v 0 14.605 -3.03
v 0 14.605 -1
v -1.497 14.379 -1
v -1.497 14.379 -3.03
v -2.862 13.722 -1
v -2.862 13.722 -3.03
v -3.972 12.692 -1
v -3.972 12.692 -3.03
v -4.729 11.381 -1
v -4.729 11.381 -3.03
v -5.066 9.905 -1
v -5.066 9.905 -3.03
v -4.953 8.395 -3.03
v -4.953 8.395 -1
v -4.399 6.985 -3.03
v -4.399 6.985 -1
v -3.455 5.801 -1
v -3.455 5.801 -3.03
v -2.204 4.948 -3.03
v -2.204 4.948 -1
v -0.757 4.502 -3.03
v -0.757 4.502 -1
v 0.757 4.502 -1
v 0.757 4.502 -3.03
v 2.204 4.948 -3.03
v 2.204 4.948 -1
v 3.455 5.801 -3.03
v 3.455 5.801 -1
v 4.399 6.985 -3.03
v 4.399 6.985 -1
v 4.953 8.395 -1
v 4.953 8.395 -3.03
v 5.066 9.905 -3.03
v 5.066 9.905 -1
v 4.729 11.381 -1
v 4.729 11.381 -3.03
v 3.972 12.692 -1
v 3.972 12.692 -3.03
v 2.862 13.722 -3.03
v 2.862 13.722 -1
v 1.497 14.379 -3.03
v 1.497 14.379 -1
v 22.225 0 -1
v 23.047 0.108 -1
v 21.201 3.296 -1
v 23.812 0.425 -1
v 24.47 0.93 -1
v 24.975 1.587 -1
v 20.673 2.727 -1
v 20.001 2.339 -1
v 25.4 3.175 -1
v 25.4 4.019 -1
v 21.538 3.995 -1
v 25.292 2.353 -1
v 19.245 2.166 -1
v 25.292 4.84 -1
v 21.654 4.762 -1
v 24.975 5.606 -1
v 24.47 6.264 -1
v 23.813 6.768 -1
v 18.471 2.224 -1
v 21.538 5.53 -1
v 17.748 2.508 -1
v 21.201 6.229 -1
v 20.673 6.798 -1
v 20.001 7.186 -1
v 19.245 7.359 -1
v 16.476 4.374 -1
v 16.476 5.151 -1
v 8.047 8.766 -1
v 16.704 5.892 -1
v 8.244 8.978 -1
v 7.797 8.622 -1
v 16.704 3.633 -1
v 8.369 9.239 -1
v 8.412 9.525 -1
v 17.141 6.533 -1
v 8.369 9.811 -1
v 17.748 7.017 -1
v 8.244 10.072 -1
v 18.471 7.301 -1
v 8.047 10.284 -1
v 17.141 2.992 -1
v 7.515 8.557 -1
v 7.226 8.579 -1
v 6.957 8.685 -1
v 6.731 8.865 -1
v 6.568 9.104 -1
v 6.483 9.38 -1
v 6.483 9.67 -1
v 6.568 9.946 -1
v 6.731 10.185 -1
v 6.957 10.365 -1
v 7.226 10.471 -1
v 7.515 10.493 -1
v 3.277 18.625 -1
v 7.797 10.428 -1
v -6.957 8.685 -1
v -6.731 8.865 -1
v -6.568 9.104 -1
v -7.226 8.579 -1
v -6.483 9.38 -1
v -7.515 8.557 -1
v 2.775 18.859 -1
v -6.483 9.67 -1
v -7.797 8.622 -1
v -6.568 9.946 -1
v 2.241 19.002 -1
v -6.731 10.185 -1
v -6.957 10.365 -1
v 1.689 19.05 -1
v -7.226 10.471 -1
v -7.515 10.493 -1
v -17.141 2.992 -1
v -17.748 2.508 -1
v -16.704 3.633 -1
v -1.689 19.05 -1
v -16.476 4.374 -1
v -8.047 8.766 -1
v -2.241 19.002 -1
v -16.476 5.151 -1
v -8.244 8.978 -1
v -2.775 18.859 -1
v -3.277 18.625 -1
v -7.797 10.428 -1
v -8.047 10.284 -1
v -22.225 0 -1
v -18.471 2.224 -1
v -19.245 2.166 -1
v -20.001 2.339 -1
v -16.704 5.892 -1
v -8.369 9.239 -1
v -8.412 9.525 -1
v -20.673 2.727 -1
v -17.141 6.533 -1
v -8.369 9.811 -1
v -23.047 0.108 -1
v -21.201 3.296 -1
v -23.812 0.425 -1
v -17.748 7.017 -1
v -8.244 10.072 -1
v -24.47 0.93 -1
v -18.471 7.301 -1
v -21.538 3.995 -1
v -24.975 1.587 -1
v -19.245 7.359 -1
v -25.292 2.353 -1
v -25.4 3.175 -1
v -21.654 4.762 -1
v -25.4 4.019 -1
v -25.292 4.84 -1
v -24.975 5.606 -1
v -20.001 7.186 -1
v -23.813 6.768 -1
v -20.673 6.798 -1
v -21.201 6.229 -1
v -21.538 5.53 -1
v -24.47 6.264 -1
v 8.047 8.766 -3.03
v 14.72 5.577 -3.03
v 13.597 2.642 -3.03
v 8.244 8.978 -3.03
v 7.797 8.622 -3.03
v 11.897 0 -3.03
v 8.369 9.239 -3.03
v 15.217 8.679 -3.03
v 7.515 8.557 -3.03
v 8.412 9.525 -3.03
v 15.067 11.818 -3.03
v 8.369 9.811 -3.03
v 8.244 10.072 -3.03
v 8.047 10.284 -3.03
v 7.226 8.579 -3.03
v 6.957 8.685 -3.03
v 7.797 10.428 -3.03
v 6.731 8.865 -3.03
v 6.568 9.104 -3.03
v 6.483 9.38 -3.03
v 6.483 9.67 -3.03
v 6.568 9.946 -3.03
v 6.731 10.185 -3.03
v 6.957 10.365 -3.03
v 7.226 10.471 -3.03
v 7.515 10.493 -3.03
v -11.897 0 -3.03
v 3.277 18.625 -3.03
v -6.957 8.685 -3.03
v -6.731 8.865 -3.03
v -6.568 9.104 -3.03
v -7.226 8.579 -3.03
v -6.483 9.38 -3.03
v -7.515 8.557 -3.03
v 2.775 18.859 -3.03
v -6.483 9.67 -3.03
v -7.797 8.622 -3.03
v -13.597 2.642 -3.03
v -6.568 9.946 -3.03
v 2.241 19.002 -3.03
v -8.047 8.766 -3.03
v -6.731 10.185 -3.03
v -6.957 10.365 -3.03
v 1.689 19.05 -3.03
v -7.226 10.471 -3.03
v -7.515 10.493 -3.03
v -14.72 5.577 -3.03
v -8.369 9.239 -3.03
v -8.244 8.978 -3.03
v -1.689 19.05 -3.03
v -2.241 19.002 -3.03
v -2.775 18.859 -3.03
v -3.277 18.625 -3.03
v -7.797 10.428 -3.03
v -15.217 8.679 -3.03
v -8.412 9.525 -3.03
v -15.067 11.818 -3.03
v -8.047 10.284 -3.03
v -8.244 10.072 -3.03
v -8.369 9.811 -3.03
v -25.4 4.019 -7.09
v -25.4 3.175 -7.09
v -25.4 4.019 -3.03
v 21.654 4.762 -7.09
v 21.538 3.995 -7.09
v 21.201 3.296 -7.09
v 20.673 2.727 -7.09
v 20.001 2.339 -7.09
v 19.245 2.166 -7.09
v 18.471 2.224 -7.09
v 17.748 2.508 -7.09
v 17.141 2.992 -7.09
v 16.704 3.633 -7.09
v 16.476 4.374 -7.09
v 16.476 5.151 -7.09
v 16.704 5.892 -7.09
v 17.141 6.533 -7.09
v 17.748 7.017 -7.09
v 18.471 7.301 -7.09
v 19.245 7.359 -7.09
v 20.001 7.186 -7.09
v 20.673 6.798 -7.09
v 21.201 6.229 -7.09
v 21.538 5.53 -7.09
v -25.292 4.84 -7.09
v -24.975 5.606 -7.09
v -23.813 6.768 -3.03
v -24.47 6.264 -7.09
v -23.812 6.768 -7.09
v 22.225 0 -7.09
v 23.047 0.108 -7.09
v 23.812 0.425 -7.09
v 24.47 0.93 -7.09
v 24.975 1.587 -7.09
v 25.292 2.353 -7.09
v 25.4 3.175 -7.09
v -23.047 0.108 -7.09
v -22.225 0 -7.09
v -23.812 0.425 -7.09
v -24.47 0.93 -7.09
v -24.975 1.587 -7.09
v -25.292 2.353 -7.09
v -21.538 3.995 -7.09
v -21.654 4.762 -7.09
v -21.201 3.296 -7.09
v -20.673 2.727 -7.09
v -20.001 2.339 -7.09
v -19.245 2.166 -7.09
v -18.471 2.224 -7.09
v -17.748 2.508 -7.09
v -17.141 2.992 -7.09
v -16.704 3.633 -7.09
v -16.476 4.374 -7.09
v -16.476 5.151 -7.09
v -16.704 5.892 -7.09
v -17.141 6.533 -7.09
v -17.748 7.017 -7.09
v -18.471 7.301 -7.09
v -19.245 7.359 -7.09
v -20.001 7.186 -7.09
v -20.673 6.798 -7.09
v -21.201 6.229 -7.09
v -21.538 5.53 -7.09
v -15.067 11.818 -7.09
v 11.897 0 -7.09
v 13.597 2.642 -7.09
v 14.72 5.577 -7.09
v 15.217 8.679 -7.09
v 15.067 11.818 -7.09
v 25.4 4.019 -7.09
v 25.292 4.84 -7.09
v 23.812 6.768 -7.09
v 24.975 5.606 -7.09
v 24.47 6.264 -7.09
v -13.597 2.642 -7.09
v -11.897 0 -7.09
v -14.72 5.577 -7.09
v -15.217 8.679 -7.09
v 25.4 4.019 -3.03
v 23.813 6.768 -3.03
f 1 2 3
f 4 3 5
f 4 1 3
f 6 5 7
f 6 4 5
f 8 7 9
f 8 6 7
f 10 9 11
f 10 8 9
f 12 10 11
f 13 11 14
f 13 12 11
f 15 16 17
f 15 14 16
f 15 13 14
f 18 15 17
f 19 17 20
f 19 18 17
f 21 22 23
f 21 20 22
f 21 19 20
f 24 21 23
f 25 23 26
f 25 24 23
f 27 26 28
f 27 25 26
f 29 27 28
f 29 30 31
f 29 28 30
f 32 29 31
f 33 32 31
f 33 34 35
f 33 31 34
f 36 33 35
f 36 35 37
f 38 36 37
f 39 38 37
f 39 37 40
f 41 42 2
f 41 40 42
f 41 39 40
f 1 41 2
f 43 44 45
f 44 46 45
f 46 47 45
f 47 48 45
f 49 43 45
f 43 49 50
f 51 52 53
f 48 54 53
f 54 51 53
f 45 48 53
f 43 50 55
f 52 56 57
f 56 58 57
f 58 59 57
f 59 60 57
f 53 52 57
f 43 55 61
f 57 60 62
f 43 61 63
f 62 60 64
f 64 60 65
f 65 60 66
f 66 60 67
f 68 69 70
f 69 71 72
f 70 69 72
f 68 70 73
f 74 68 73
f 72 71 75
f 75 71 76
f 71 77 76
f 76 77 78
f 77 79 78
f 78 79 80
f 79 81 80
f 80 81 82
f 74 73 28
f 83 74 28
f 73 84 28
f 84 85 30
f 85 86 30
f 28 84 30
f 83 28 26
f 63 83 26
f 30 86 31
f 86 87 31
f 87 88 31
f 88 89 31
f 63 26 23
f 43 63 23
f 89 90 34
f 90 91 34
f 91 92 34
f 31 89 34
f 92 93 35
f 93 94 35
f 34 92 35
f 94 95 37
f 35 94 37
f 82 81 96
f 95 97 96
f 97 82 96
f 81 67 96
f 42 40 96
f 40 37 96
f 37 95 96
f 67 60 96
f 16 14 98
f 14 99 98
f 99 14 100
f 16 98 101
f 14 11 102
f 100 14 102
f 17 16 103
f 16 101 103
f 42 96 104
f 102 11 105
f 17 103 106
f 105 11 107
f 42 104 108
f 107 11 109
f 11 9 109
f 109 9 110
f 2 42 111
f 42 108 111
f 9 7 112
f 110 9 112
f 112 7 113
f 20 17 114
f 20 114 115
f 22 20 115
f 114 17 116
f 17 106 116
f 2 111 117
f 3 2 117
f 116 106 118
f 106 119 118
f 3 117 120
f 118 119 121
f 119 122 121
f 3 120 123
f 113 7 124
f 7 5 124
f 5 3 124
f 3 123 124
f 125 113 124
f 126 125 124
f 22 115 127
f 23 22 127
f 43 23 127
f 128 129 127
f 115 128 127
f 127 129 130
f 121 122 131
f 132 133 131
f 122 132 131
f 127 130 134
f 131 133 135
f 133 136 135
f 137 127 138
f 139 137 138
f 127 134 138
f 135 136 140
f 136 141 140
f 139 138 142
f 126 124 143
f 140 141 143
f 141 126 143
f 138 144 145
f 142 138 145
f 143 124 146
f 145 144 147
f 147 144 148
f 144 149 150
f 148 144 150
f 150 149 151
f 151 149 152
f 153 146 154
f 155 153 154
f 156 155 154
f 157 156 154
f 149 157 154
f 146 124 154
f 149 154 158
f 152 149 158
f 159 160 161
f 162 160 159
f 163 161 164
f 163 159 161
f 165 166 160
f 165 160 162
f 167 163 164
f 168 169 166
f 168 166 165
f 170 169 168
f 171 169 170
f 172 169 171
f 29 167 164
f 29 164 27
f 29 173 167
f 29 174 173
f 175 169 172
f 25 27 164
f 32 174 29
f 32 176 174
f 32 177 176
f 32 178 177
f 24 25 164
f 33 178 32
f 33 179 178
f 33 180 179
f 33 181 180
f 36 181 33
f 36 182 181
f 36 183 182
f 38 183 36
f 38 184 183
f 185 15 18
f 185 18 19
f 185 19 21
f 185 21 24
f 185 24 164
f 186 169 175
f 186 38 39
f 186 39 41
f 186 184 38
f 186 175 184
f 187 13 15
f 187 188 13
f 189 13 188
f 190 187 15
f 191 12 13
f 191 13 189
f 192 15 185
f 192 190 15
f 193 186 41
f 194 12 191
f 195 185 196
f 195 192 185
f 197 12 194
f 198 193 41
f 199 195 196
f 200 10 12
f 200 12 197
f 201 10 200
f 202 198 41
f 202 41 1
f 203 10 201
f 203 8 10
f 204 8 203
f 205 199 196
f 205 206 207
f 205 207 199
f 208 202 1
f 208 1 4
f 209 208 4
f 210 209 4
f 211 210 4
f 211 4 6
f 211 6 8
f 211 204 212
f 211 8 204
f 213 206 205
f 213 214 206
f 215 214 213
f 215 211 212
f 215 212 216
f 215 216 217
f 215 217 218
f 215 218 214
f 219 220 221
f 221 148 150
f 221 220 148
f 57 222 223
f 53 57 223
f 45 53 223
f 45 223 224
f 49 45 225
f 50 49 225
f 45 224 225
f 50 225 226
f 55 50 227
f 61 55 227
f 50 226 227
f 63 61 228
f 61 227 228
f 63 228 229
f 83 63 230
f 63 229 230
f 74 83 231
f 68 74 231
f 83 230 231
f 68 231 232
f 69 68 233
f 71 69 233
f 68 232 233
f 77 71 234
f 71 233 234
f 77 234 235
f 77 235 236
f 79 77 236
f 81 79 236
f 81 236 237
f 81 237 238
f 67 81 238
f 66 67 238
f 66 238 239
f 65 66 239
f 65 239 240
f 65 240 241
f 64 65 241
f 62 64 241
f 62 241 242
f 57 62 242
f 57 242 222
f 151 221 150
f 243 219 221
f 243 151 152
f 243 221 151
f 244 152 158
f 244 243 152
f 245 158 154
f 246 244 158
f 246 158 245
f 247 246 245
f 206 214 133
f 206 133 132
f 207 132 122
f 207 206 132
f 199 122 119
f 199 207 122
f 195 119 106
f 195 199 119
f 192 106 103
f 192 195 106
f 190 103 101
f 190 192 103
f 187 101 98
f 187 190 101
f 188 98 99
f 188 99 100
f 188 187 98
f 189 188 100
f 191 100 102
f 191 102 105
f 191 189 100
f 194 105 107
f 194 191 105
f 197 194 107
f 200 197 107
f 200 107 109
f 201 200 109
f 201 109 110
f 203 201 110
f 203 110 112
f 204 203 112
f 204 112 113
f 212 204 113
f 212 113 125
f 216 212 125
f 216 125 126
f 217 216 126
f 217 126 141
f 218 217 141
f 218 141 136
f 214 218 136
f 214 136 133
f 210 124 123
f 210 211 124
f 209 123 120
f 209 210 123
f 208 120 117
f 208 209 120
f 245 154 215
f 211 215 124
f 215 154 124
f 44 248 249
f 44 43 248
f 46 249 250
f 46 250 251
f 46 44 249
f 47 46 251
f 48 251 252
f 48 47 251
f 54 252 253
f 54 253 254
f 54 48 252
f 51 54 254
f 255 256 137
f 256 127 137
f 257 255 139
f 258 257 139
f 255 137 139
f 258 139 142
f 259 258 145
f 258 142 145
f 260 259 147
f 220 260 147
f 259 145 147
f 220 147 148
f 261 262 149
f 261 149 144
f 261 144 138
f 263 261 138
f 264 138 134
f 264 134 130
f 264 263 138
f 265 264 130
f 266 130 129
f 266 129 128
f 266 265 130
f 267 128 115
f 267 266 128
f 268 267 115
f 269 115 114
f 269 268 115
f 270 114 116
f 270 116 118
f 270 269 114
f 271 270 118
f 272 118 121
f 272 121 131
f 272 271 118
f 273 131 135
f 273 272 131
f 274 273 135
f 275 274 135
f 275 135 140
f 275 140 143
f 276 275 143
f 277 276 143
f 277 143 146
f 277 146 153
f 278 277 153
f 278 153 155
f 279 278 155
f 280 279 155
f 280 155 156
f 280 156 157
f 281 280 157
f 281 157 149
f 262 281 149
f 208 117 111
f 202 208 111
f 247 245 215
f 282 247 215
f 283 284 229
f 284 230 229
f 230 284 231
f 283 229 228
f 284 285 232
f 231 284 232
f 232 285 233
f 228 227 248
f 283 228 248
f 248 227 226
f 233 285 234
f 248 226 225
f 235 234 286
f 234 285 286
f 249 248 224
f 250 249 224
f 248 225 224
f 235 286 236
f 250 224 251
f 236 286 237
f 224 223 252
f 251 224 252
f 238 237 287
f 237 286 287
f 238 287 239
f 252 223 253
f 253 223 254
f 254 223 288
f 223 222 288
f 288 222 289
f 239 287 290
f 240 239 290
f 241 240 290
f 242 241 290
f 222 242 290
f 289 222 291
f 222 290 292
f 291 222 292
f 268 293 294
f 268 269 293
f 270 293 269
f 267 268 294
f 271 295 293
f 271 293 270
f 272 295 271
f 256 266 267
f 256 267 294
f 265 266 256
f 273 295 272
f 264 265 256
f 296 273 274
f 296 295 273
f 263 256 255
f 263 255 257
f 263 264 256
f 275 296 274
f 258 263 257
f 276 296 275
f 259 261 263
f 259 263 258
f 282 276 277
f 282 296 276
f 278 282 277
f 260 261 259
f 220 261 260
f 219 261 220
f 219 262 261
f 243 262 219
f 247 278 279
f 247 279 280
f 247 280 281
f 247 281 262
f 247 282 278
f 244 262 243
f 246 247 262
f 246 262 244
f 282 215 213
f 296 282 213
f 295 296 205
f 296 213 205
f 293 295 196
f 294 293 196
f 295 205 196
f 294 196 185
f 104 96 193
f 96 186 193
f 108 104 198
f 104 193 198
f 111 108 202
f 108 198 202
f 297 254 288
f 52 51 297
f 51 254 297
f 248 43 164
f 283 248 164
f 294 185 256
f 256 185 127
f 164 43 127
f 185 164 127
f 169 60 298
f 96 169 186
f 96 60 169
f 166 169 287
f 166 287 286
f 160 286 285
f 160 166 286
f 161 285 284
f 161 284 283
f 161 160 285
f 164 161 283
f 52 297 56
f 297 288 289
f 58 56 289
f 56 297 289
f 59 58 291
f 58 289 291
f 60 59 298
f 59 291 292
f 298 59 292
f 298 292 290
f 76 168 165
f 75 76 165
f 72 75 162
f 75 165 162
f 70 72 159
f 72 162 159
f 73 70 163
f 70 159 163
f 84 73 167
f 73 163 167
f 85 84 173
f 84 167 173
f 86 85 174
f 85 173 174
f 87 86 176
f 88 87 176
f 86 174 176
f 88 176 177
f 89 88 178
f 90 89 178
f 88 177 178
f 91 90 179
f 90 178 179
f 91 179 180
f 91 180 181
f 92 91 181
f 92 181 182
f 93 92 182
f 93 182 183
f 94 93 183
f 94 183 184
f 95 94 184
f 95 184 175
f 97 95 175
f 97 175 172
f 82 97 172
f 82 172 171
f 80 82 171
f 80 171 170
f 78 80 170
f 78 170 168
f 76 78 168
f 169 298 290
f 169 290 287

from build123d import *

# Parameters (mm, degrees)
EXTRUDE1_START = -1
EXTRUDE1_DEPTH = 2.03
EXTRUDE2_DEPTH = 4.06
SKETCH4_R      = 5.08
SKETCH4_R_2    = 2.6035
SKETCH4_R_3    = 0.97028
EXTRUDE3_DEPTH = 33.328789028
FILLET1_R      = 3.175


with BuildPart() as part:
    # Sketch1 → Extrude1 (new body)
    with BuildSketch(Plane.XY.offset(EXTRUDE1_START)):
        Polygon((0, 19.05), (0, 0), (25.4, 0), (25.4, 5.851775032), (2.540003786, 19.05), align=None)
    extrude(amount=-EXTRUDE1_DEPTH)

    # Sketch2 → Extrude2 (add)
    with BuildSketch(Plane(origin=(0, 0, -3.03), x_dir=(-1, 0, 0), z_dir=(0, 0, -1))):
        with BuildLine():
            Line((-11.896721187, 0), (-25.4, 0))
            Line((-25.4, 0), (-25.4, 5.851775032))
            Line((-25.4, 5.851775032), (-15.066541319, 11.817800183))
            ThreePointArc((-15.066541319, 11.817800183), (-14.71969706, 5.576820867), (-11.896721187, 0))
        make_face()
    extrude(amount=EXTRUDE2_DEPTH)

    # Sketch4 → Extrude3 (cut, through all)
    with BuildSketch(Plane(origin=(0, 0, -7.09), x_dir=(-1, 0, 0), z_dir=(0, 0, -1))):
        with Locations((0, 9.525)):
            Circle(SKETCH4_R)
        with Locations(Location((-19.05, 4.7625, 0), (0, 0, 180))):
            Circle(SKETCH4_R_2)
        with Locations(Location((-7.4422, 9.525, 0), (0, 0, 180))):
            Circle(SKETCH4_R_3)
    extrude(amount=-EXTRUDE3_DEPTH, mode=Mode.SUBTRACT)

    # Fillet1
    fillet1_edges = [part.edges().sort_by_distance(p)[0] for p in [
        (2.540003786, 19.05, -2.015),
        (25.4, 5.851775032, -4.045),
        (25.4, 0, -4.045),
    ]]
    fillet(fillet1_edges, radius=FILLET1_R)

    # Mirror1: part across plane


with BuildPart() as part_1:
    add(part.part)
    add(part.part.mirror(Plane(origin=(0, 19.05, -3.03), x_dir=(0, 0, 1), z_dir=(-1, 0, 0))))


solid = part_1.part
